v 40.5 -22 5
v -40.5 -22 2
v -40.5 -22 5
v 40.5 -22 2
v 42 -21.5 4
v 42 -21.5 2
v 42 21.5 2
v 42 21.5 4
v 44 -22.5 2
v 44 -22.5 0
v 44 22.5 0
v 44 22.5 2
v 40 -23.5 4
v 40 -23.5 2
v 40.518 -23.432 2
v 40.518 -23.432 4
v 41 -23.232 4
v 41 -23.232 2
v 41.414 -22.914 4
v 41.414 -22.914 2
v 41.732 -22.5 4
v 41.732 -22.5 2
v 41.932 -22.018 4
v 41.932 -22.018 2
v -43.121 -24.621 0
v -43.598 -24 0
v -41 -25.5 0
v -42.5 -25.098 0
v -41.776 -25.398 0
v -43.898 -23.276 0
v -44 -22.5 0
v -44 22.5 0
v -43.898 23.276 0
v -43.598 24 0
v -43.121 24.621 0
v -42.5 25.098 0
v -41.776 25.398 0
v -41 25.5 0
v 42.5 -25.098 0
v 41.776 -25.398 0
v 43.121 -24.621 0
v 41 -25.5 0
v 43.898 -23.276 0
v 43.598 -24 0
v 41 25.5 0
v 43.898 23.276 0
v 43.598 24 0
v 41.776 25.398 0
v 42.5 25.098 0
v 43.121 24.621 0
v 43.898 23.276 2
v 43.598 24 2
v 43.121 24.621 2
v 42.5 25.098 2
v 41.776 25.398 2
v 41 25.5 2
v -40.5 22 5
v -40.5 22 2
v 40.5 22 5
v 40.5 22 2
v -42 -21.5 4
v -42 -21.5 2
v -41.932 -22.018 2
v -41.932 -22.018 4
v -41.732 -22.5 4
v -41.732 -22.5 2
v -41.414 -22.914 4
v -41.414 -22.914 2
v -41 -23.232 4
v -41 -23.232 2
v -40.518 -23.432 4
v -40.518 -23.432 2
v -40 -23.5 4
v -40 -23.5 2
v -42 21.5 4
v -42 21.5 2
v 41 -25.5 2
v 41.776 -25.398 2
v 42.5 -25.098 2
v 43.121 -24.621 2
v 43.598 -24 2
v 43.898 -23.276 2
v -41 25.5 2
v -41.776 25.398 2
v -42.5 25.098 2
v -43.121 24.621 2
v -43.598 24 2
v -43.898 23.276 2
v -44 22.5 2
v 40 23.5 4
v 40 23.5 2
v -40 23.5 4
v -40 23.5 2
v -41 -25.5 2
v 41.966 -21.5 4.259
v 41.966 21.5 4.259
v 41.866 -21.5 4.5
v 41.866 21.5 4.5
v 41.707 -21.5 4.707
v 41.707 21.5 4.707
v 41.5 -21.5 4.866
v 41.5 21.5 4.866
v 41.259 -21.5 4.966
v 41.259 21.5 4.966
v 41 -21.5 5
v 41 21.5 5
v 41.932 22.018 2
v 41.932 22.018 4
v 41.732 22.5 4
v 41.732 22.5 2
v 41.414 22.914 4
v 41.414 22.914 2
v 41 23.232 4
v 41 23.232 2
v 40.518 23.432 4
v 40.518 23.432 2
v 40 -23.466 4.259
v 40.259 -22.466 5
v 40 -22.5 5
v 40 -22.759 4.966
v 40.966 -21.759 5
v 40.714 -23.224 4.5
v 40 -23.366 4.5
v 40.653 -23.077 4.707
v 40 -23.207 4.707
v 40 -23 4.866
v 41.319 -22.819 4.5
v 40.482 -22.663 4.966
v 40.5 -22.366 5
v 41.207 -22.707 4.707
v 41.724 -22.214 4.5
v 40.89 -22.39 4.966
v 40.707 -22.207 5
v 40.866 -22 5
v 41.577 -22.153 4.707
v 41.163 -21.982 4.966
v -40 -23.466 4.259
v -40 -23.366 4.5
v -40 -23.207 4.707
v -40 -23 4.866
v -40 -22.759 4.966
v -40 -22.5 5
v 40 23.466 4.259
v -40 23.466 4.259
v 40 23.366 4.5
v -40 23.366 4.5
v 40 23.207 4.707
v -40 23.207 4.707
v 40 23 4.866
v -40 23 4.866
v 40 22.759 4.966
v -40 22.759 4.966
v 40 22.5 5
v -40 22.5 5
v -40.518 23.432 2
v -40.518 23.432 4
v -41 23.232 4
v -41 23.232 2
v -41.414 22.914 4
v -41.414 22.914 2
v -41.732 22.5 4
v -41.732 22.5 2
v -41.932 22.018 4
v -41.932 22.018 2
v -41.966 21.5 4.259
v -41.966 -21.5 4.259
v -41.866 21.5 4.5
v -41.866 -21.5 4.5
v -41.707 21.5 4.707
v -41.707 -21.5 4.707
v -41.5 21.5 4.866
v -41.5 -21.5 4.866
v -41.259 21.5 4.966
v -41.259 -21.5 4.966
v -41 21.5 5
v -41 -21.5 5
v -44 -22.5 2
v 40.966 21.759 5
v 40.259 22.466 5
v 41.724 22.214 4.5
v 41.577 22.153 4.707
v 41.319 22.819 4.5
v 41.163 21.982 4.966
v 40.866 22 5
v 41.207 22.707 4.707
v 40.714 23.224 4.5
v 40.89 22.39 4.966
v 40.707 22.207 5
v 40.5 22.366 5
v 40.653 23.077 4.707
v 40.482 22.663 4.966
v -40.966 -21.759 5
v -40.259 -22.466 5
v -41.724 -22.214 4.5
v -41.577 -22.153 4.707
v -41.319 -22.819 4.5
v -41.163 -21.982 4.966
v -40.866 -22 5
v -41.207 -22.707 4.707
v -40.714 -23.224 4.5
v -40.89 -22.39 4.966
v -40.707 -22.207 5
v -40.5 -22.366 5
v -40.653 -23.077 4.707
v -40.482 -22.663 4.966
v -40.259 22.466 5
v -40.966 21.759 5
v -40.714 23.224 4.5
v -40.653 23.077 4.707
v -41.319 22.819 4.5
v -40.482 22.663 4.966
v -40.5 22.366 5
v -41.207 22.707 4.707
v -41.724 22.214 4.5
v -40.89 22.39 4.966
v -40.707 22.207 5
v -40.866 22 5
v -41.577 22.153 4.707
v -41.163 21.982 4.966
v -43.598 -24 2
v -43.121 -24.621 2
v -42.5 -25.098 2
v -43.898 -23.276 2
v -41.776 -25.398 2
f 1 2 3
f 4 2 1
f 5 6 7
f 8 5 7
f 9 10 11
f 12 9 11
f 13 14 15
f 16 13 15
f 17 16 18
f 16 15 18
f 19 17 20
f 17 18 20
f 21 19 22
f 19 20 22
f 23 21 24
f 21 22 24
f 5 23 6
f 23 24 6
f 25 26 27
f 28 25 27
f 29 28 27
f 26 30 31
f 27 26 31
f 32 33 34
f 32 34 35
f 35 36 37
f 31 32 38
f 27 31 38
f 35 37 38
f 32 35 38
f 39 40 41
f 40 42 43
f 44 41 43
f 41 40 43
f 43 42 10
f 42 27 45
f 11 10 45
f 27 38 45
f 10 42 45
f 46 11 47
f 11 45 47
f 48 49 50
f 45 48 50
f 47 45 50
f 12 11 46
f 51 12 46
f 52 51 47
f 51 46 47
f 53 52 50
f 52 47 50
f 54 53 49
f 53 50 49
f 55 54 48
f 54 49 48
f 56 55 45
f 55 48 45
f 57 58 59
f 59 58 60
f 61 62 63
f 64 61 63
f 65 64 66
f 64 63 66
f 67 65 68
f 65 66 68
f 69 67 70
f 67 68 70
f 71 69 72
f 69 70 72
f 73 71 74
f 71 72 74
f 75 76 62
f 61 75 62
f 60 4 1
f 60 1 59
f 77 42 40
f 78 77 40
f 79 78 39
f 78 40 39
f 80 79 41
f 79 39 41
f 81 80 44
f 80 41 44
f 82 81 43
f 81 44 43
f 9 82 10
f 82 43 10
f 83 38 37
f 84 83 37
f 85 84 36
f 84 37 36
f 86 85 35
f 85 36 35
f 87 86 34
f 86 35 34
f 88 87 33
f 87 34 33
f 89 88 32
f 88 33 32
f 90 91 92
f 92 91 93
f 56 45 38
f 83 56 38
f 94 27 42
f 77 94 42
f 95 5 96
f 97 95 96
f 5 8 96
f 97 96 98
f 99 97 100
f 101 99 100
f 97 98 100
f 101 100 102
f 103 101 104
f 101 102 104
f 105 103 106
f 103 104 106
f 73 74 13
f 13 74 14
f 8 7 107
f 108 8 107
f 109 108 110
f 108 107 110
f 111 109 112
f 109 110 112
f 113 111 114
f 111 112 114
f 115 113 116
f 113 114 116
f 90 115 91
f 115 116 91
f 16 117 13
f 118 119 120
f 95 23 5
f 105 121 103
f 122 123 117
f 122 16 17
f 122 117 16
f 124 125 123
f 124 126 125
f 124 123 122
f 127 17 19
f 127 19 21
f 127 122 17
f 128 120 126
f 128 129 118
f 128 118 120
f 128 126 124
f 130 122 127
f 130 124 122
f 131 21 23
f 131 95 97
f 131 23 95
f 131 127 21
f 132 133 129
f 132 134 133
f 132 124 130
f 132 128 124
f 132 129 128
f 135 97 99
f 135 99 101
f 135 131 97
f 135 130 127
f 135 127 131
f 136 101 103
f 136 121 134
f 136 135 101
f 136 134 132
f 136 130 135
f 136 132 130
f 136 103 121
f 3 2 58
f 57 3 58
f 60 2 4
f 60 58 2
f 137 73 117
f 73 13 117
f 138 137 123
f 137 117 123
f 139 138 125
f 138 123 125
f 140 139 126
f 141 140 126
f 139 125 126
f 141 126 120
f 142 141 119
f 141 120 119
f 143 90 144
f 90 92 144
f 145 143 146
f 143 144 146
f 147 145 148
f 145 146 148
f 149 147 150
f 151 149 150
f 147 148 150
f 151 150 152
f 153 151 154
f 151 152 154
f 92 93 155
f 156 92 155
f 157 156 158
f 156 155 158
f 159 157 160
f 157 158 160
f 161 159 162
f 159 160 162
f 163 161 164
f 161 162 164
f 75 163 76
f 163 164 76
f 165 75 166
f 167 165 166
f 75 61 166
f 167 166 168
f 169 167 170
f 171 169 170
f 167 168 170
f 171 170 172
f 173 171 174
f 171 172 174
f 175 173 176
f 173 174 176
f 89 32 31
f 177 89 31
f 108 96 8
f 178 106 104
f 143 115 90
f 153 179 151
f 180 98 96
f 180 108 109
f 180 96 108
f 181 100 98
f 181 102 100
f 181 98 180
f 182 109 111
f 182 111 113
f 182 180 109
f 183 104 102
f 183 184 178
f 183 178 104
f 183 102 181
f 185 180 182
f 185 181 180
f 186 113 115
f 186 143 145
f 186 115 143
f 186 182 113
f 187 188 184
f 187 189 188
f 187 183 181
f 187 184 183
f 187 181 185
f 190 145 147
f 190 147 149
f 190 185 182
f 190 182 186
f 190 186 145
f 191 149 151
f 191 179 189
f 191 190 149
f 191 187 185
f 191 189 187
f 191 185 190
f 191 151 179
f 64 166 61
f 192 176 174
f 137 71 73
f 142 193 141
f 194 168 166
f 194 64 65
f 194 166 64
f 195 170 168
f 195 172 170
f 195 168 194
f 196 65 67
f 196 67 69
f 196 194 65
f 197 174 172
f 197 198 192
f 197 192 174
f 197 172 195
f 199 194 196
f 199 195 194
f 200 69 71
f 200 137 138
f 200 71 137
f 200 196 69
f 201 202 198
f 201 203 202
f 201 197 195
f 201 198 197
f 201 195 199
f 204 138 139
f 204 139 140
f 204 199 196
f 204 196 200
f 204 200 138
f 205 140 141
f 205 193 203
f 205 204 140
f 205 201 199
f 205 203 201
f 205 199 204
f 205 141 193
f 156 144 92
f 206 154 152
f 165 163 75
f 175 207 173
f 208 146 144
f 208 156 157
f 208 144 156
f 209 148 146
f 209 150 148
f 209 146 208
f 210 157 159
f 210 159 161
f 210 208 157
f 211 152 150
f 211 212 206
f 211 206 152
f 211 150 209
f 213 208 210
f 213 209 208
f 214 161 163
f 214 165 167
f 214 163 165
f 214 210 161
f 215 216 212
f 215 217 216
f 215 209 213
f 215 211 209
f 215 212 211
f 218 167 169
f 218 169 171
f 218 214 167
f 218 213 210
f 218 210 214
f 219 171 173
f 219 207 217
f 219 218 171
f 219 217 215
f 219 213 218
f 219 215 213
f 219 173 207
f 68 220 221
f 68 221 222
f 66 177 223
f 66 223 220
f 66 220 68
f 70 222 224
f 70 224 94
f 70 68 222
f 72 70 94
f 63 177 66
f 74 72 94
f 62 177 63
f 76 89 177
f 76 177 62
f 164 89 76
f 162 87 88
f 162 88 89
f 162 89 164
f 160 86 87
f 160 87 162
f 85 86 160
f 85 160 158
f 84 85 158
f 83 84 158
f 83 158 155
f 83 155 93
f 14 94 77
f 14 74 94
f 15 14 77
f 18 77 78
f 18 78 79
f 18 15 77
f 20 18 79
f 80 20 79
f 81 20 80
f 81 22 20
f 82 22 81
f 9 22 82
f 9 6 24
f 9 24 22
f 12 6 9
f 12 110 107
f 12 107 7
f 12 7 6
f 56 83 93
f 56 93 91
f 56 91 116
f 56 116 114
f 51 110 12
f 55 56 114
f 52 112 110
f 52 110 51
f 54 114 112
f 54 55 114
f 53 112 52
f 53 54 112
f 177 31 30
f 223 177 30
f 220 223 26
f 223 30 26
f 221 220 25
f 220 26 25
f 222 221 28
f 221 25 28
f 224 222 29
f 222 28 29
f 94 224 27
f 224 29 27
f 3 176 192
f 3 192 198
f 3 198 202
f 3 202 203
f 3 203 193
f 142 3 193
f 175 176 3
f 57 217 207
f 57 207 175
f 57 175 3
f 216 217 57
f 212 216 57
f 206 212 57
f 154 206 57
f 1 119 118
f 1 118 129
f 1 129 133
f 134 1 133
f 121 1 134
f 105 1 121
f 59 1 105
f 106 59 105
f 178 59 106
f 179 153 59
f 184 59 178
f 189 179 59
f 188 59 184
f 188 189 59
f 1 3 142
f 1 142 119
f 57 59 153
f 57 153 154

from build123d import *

# Parameters (mm, degrees)
F0_W     = 81
F0_H     = 44
F1_DEPTH = 2
F2_DEPTH = 5
F3_R     = 1


with BuildPart() as f1:
    # F0 (on Top) → F1 (new body)
    with BuildSketch(Plane.XY):
        with BuildLine():
            Line((-41, -25.5), (41, -25.5))
            ThreePointArc((41, -25.5), (43.1213203436, -24.6213203436), (44, -22.5))
            Line((44, -22.5), (44, 22.5))
            ThreePointArc((44, 22.5), (43.1213203436, 24.6213203436), (41, 25.5))
            Line((41, 25.5), (-41, 25.5))
            ThreePointArc((-41, 25.5), (-43.1213203436, 24.6213203436), (-44, 22.5))
            Line((-44, 22.5), (-44, -22.5))
            ThreePointArc((-44, -22.5), (-43.1213203436, -24.6213203436), (-41, -25.5))
        make_face()
        with BuildLine():
            Line((-40, 23.5), (40, 23.5))
            ThreePointArc((40, 23.5), (41.4142135624, 22.9142135624), (42, 21.5))
            Line((42, 21.5), (42, -21.5))
            ThreePointArc((42, -21.5), (41.4142135624, -22.9142135624), (40, -23.5))
            Line((40, -23.5), (-40, -23.5))
            ThreePointArc((-40, -23.5), (-41.4142135624, -22.9142135624), (-42, -21.5))
            Line((-42, -21.5), (-42, 21.5))
            ThreePointArc((-42, 21.5), (-41.4142135624, 22.9142135624), (-40, 23.5))
        make_face(mode=Mode.SUBTRACT)
        with BuildLine():
            ThreePointArc((42, 21.5), (41.4142135624, 22.9142135624), (40, 23.5))
            Line((40, 23.5), (-40, 23.5))
            ThreePointArc((-40, 23.5), (-41.4142135624, 22.9142135624), (-42, 21.5))
            Line((-42, 21.5), (-42, -21.5))
            ThreePointArc((-42, -21.5), (-41.4142135624, -22.9142135624), (-40, -23.5))
            Line((-40, -23.5), (40, -23.5))
            ThreePointArc((40, -23.5), (41.4142135624, -22.9142135624), (42, -21.5))
            Line((42, -21.5), (42, 21.5))
        make_face()
        Rectangle(F0_W, F0_H, mode=Mode.SUBTRACT)
        Rectangle(F0_W, F0_H)
    extrude(amount=F1_DEPTH)

    # F0 (on Top) → F2 (join)
    with BuildSketch(Plane.XY):
        with BuildLine():
            ThreePointArc((42, 21.5), (41.4142135624, 22.9142135624), (40, 23.5))
            Line((40, 23.5), (-40, 23.5))
            ThreePointArc((-40, 23.5), (-41.4142135624, 22.9142135624), (-42, 21.5))
            Line((-42, 21.5), (-42, -21.5))
            ThreePointArc((-42, -21.5), (-41.4142135624, -22.9142135624), (-40, -23.5))
            Line((-40, -23.5), (40, -23.5))
            ThreePointArc((40, -23.5), (41.4142135624, -22.9142135624), (42, -21.5))
            Line((42, -21.5), (42, 21.5))
        make_face()
        Rectangle(F0_W, F0_H, mode=Mode.SUBTRACT)
    extrude(amount=F2_DEPTH)

    # F3
    f3_edges = [f1.edges().sort_by_distance(p)[0] for p in [
        (-42, 0, 5),
    ]]
    fillet(f3_edges, radius=F3_R)


solid = f1.part
